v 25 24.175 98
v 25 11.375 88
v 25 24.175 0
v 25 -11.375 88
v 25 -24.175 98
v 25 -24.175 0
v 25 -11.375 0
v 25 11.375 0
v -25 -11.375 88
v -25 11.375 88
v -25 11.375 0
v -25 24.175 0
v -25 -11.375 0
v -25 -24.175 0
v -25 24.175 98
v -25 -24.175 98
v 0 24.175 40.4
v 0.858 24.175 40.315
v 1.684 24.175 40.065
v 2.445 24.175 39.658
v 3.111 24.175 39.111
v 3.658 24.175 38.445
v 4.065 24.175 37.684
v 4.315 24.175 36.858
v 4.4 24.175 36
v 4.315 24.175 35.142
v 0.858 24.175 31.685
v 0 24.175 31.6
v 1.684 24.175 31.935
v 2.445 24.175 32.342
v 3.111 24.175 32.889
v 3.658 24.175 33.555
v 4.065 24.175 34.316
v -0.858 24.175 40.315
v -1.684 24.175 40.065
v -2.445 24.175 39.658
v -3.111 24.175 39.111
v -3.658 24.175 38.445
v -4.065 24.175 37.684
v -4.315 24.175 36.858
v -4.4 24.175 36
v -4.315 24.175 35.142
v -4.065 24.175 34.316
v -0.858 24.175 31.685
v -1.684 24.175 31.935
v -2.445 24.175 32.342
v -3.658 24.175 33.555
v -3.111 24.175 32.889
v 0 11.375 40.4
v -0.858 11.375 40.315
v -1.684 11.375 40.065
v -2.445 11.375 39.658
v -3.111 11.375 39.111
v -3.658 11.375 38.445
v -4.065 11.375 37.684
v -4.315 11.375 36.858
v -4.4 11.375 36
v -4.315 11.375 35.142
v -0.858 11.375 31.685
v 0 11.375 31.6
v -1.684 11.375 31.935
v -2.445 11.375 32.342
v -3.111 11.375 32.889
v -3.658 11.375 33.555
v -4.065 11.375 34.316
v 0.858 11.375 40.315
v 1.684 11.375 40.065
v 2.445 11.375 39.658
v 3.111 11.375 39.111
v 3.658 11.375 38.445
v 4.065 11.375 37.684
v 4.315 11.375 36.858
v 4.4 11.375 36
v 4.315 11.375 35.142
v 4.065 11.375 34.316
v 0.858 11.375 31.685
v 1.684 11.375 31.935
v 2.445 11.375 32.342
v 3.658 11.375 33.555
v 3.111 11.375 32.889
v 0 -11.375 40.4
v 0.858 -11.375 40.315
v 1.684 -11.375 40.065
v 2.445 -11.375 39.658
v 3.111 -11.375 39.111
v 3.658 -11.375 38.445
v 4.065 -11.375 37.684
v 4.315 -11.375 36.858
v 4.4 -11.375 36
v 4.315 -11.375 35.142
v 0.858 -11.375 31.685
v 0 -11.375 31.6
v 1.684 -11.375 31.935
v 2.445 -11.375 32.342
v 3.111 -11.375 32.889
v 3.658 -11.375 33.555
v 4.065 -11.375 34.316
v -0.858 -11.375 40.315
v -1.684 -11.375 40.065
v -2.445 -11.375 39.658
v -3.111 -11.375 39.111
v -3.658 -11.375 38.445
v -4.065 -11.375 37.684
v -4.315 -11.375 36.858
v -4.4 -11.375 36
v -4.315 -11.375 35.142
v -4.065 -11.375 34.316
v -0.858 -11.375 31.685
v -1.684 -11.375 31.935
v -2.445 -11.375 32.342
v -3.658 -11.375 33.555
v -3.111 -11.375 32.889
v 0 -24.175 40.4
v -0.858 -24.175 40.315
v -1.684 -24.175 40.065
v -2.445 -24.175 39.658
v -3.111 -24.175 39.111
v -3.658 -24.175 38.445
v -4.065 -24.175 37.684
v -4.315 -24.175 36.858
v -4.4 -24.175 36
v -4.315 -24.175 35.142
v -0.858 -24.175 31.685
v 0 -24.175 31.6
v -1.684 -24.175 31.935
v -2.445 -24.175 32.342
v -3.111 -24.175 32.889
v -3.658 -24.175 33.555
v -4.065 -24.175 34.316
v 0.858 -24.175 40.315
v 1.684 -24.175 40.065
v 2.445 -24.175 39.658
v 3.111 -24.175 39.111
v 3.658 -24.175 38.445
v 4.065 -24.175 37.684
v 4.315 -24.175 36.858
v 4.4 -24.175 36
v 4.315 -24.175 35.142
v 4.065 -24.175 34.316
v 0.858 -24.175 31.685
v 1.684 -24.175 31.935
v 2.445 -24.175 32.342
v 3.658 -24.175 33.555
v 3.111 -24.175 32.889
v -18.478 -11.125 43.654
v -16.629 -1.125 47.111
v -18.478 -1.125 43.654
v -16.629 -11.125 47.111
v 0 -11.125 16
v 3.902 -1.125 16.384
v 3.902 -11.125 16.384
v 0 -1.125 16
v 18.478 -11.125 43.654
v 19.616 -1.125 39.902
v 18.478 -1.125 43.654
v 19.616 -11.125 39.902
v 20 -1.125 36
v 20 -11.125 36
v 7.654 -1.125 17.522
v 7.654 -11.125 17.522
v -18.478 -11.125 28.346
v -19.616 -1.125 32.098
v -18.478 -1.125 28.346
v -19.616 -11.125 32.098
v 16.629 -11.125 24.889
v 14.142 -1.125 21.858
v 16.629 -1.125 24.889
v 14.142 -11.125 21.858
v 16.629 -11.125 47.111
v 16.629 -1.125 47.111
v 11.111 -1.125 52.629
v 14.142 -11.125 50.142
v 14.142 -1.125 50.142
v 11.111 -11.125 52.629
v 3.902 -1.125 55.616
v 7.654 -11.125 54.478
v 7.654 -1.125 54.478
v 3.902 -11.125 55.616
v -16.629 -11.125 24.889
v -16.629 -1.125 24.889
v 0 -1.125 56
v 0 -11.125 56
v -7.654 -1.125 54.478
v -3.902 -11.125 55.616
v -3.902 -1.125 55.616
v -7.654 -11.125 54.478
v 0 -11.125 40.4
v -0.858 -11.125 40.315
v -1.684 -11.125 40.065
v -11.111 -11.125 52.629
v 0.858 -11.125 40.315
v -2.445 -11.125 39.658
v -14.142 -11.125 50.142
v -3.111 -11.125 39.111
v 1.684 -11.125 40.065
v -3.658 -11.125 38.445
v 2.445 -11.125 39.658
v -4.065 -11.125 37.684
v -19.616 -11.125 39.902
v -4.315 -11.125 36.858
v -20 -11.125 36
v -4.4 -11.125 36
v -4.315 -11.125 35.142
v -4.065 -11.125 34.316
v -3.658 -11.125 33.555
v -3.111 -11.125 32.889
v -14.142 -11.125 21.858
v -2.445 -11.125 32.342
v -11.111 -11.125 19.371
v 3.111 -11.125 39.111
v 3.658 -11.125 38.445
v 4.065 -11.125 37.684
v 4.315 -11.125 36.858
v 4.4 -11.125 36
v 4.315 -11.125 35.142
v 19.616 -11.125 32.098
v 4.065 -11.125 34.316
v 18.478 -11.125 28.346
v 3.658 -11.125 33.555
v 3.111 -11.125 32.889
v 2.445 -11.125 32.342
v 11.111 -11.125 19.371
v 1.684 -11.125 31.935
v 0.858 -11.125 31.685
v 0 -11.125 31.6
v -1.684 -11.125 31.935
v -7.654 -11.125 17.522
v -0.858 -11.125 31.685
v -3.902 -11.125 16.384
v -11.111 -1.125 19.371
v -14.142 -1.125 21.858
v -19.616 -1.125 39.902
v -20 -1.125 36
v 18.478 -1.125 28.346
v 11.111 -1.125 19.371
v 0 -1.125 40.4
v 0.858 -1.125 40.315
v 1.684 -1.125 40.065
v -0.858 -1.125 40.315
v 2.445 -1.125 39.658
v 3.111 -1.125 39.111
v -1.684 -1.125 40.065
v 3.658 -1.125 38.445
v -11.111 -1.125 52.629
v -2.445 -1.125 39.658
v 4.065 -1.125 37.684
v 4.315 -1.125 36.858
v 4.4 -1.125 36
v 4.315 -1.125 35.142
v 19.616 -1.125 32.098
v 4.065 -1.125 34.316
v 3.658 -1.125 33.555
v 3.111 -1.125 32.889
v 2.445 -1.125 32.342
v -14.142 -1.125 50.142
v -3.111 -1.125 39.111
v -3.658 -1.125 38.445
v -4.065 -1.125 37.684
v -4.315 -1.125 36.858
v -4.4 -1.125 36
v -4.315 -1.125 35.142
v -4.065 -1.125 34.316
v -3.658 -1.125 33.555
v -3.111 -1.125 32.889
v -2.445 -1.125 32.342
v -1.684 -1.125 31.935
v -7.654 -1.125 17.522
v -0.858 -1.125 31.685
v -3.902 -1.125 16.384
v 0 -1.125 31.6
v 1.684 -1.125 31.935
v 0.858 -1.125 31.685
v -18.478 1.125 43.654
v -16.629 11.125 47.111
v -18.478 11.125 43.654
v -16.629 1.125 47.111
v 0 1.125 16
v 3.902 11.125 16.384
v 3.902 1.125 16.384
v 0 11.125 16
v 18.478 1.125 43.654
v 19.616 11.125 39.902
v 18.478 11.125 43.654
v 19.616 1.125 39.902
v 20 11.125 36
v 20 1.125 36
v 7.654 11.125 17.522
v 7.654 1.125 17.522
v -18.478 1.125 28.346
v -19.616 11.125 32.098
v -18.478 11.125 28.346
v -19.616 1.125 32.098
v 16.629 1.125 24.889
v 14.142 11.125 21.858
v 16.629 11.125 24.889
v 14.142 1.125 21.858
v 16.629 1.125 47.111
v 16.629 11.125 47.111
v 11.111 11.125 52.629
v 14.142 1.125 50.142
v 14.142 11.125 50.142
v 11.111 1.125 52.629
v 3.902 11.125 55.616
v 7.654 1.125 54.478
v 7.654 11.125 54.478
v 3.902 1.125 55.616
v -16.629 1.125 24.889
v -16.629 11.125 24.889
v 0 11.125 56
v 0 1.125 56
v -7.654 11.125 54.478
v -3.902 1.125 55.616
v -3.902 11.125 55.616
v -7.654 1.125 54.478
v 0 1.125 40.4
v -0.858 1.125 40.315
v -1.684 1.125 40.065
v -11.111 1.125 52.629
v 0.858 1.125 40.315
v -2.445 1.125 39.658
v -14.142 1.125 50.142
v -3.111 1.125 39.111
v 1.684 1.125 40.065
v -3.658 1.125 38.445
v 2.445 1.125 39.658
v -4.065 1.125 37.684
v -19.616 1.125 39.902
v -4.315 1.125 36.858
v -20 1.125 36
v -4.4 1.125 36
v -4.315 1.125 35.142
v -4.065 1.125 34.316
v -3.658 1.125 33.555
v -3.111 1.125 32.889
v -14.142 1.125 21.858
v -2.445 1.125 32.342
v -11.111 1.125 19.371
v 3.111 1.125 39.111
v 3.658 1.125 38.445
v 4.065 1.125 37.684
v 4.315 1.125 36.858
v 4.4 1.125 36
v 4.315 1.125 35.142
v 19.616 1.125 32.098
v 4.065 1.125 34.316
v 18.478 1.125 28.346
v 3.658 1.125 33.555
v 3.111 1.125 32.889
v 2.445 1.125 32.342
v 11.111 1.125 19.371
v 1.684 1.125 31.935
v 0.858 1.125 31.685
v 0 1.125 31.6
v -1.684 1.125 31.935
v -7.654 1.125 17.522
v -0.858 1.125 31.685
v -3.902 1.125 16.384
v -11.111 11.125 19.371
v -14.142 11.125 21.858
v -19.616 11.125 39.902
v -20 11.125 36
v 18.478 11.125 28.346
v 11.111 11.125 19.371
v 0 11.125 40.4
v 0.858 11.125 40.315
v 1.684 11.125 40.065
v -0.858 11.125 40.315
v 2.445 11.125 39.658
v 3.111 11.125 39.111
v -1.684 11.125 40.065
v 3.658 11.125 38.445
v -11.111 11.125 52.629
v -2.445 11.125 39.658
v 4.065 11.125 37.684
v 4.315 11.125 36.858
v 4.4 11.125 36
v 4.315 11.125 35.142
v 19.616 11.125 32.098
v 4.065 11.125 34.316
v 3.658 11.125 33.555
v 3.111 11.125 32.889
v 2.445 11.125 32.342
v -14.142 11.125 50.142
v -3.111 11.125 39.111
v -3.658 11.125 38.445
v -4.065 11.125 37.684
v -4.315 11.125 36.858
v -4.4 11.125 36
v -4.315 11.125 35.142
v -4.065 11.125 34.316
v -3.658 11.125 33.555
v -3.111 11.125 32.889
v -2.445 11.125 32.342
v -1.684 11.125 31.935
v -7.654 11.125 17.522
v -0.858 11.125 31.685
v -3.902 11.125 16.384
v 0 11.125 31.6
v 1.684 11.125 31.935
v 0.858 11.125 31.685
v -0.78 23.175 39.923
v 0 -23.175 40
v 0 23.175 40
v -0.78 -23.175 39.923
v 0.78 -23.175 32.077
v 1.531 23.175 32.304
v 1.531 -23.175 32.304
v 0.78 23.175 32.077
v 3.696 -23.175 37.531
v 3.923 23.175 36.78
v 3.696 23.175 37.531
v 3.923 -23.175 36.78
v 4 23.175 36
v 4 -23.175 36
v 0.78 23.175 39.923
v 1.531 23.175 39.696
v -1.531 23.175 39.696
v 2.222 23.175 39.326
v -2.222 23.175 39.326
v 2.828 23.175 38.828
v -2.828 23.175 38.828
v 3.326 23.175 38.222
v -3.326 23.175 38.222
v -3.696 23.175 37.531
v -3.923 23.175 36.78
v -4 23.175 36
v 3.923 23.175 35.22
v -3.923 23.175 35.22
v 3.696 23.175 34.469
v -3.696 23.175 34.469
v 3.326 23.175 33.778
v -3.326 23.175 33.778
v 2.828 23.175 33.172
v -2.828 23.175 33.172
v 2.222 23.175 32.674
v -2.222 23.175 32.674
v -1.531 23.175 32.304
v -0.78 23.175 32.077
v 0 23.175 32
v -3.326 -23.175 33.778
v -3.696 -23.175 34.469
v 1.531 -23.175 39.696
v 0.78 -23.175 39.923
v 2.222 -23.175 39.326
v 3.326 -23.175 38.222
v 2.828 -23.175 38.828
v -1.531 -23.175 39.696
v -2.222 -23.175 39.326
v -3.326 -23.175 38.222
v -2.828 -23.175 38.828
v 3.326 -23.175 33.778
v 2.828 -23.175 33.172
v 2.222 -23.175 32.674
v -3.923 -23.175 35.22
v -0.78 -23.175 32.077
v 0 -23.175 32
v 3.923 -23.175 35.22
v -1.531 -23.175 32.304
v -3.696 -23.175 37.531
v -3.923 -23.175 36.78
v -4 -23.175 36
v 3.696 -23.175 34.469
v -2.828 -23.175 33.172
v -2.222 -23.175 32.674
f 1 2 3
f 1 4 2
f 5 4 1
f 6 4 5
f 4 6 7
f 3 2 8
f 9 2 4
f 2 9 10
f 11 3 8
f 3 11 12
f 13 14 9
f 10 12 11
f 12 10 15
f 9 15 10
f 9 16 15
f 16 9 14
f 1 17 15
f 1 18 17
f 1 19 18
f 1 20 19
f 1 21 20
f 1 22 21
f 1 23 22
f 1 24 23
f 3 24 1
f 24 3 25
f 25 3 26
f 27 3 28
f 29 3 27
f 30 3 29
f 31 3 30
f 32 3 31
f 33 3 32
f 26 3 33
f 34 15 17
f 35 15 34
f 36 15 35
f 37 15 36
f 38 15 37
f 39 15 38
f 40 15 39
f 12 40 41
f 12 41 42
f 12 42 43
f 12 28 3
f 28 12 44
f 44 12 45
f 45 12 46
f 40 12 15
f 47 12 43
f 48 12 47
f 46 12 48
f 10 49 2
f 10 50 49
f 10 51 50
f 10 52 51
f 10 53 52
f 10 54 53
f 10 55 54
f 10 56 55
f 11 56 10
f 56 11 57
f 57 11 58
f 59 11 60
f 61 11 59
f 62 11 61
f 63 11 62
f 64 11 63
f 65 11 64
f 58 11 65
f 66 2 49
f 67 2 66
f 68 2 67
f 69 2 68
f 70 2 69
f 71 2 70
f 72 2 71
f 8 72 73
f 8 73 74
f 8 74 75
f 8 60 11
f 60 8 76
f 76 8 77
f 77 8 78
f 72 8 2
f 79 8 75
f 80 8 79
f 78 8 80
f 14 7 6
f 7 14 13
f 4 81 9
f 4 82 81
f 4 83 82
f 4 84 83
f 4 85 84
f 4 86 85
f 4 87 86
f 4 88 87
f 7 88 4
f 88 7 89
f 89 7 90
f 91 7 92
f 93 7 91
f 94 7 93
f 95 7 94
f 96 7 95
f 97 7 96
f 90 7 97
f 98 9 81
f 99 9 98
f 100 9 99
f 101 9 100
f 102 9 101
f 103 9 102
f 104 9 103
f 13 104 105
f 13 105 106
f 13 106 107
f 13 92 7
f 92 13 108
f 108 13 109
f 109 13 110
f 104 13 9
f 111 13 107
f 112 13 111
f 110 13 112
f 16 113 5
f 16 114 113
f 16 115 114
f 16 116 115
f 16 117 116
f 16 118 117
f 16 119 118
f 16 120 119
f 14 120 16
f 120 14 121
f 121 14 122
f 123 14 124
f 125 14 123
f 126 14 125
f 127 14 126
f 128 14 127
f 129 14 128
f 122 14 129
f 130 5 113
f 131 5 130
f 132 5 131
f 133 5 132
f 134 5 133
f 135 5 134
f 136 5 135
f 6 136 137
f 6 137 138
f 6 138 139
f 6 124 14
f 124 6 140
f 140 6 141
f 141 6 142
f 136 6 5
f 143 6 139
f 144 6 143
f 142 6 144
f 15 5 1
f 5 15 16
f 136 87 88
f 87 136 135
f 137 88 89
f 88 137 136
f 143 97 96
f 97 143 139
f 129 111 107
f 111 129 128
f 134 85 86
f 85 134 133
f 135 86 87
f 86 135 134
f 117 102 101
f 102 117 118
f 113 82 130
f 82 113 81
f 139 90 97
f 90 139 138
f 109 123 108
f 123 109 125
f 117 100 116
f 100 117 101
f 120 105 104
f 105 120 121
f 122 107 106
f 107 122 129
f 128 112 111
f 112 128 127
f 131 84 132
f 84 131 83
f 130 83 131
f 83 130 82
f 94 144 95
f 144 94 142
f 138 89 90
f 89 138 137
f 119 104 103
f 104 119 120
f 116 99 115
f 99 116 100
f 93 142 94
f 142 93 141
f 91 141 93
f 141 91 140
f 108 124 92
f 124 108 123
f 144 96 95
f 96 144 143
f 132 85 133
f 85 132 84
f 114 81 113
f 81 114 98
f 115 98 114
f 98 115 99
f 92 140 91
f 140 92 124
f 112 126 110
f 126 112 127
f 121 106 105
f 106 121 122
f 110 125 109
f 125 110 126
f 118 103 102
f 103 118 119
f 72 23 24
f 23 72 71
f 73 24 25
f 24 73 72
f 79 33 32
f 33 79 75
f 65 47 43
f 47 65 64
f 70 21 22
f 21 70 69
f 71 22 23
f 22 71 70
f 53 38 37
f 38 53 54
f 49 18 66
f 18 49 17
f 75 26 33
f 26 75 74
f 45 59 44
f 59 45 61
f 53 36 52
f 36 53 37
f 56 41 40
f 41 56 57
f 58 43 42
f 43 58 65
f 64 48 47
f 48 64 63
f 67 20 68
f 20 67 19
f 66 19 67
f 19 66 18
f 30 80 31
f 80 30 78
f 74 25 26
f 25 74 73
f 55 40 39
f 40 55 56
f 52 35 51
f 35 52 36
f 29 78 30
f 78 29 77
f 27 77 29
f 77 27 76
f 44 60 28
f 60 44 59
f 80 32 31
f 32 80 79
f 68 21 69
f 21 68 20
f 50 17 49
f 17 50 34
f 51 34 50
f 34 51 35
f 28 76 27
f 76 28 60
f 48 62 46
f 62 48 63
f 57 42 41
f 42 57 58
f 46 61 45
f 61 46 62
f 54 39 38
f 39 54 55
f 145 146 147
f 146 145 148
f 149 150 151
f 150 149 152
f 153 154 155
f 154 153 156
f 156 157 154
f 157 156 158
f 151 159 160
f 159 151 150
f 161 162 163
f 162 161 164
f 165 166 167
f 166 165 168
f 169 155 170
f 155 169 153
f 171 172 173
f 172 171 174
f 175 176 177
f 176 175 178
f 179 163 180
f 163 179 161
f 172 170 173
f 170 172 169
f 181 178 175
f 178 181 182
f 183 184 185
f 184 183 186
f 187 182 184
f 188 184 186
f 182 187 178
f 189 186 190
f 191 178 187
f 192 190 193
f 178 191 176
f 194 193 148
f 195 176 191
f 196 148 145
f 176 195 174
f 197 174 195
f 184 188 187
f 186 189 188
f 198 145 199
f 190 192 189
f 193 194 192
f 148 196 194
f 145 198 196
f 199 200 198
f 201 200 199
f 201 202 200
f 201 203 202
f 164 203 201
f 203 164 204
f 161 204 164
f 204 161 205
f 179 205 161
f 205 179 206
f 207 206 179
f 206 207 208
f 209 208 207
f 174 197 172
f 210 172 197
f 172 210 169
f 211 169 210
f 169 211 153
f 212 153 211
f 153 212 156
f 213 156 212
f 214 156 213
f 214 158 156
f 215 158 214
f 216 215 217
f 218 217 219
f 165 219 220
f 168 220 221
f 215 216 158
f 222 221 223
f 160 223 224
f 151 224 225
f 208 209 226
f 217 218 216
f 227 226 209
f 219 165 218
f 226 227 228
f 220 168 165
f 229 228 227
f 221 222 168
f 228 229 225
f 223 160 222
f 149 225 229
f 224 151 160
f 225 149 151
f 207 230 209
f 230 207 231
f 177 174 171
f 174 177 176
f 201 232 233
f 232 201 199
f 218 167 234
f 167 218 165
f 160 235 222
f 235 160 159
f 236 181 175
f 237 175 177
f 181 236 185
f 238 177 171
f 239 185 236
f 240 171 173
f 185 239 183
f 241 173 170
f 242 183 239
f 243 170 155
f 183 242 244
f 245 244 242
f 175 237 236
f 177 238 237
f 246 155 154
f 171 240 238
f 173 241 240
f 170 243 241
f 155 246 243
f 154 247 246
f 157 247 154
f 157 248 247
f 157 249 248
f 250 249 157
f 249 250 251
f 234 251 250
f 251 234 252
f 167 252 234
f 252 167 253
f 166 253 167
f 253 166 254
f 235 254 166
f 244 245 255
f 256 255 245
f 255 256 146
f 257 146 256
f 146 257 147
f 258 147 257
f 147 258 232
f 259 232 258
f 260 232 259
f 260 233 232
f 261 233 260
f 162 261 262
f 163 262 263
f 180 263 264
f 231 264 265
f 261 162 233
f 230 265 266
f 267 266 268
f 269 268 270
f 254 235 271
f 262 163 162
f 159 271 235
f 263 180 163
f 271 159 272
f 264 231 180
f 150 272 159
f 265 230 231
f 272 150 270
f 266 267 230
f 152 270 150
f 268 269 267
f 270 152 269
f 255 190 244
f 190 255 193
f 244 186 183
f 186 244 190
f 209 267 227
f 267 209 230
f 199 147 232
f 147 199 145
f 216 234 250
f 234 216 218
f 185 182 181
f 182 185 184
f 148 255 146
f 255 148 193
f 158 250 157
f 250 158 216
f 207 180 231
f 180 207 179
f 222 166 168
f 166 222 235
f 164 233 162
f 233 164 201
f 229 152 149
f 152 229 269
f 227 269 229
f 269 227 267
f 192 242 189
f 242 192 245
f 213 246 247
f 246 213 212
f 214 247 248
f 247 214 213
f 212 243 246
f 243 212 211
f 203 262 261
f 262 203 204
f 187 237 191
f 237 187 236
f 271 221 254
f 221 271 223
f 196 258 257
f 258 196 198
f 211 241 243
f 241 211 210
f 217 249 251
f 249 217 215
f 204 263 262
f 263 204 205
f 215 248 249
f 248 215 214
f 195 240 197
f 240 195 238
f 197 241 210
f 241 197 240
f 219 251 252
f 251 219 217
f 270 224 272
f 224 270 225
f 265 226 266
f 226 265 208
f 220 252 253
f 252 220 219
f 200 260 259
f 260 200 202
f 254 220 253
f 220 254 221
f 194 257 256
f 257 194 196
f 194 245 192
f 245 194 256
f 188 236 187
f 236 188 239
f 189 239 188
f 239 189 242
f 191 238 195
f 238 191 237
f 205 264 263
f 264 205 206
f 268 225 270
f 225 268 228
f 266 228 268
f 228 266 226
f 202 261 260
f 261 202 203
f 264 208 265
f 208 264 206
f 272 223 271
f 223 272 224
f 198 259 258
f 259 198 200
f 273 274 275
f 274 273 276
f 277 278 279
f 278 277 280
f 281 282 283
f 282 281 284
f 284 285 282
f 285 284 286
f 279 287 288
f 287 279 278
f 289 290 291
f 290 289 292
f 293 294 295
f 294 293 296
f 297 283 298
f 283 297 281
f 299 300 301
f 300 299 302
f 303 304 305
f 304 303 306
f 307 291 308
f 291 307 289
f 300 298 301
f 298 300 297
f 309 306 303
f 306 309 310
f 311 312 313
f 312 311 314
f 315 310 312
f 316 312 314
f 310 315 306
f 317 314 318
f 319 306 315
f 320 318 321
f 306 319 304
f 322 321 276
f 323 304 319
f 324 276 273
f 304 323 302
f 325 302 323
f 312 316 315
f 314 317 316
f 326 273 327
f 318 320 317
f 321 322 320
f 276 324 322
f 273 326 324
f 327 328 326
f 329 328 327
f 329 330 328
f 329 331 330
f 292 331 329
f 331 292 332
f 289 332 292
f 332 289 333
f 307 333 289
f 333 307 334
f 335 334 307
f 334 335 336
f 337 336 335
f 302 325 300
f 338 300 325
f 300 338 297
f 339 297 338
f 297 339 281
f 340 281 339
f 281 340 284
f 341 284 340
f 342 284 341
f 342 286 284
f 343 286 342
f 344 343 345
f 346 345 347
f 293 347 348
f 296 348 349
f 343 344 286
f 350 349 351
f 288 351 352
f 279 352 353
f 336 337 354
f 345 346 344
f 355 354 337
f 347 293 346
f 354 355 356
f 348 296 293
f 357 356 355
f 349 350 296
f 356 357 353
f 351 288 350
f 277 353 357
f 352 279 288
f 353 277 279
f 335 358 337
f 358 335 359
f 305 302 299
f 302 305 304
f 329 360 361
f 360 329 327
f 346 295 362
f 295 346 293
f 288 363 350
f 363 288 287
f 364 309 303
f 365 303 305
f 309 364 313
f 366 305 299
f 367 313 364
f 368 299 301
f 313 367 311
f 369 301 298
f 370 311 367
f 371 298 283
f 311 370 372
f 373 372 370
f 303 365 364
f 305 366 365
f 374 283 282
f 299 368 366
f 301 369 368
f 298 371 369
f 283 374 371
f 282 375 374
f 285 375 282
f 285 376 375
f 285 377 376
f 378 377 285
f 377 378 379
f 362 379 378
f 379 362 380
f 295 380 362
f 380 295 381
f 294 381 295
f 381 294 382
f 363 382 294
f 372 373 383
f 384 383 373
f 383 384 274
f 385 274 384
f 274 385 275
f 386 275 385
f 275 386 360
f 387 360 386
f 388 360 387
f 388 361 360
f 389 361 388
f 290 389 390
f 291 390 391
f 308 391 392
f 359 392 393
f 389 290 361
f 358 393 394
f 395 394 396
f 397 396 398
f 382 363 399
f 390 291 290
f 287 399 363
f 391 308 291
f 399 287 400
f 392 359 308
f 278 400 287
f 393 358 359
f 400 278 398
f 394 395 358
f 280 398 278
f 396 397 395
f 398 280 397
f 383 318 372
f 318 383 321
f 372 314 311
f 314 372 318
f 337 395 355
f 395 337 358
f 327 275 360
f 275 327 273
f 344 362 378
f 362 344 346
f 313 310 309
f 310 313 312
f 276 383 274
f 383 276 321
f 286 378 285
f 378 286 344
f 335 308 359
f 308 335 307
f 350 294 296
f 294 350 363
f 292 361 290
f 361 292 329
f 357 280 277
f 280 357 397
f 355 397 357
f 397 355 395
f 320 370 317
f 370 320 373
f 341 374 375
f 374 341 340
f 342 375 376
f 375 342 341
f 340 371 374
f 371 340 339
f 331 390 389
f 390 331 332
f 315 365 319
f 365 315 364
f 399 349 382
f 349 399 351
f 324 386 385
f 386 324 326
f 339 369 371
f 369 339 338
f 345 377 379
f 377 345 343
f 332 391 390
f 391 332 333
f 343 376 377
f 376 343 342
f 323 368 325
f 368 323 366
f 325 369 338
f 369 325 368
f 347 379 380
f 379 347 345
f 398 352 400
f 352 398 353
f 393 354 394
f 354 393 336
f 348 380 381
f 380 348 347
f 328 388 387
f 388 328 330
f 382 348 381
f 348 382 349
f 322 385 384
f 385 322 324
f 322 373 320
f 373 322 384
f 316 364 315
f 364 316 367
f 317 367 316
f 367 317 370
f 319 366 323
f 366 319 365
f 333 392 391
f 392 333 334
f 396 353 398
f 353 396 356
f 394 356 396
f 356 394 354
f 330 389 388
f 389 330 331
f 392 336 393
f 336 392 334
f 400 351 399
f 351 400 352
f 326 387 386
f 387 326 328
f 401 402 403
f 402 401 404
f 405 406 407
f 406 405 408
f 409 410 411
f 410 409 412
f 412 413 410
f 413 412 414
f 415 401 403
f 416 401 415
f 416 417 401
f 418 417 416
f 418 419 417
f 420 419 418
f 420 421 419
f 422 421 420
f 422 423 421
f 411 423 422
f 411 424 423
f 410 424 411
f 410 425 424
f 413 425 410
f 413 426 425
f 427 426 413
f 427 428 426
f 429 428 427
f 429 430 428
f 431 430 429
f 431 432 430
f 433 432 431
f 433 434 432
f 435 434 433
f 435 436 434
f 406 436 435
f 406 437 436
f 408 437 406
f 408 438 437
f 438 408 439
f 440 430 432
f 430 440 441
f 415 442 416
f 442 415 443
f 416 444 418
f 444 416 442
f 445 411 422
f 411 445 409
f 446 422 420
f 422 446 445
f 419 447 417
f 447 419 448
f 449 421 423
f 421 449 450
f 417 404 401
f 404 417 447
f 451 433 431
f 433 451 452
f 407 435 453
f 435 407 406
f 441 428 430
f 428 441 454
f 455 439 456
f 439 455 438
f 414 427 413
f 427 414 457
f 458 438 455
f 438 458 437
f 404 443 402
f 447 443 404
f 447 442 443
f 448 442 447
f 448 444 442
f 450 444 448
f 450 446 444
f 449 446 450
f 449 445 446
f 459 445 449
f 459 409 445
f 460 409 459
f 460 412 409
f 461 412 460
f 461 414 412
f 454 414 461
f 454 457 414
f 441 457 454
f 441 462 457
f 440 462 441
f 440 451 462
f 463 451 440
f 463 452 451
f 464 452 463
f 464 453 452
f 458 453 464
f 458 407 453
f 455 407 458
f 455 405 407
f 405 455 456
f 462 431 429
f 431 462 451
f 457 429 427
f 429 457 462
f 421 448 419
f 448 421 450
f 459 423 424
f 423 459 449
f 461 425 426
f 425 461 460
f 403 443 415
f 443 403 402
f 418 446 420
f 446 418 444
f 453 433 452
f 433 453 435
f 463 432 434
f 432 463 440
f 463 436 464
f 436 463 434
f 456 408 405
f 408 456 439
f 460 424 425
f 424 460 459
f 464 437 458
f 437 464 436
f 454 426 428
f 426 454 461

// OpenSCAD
$fn = 32;

// ------------------------------------------------------------------------
// Trolley wheel set: wheels d40, fork 88 mm tall
// Every part is its own module, assembly() places every instance.
// ------------------------------------------------------------------------

// --- part 1 ---
module trolley_fork() {
  difference() {
    union() {
      translate([-25, 11.375, 0]) cube([50, 12.8, 88]);
      translate([-25, -24.175, 0]) cube([50, 12.8, 88]);
      translate([-25, -24.175, 88]) cube([50, 48.35, 10]);
    }
    translate([0, -17.775, 36]) rotate([90, 0, 0]) cylinder(h = 14.8, d = 8.8, center = true);
    translate([0, 17.775, 36]) rotate([90, 0, 0]) cylinder(h = 14.8, d = 8.8, center = true);
  }
}

// --- part 2 ---
module trolley_wheel() {
  difference() {
      translate([0, 0, 0]) cylinder(h = 10, d = 40);
      translate([0, 0, -1]) cylinder(h = 12, d = 8.8);
    }
}

// --- part 3 ---
module trolley_axle() {
  translate([0, 0, -23.175]) cylinder(h = 46.35, d = 8);
}

// --- assembly ---
module assembly() {
  color([0.80, 0.24, 0.20]) translate([0, 0, 0]) rotate([0, 0, 0]) trolley_fork();
  color([0.20, 0.45, 0.75]) translate([0, -1.125, 36]) rotate([90, 0, 0]) trolley_wheel();
  color([0.25, 0.62, 0.32]) translate([0, 11.125, 36]) rotate([90, 0, 0]) trolley_wheel();
  color([0.92, 0.70, 0.18]) translate([0, 0, 36]) rotate([90, 0, 0]) trolley_axle();
}

assembly();
